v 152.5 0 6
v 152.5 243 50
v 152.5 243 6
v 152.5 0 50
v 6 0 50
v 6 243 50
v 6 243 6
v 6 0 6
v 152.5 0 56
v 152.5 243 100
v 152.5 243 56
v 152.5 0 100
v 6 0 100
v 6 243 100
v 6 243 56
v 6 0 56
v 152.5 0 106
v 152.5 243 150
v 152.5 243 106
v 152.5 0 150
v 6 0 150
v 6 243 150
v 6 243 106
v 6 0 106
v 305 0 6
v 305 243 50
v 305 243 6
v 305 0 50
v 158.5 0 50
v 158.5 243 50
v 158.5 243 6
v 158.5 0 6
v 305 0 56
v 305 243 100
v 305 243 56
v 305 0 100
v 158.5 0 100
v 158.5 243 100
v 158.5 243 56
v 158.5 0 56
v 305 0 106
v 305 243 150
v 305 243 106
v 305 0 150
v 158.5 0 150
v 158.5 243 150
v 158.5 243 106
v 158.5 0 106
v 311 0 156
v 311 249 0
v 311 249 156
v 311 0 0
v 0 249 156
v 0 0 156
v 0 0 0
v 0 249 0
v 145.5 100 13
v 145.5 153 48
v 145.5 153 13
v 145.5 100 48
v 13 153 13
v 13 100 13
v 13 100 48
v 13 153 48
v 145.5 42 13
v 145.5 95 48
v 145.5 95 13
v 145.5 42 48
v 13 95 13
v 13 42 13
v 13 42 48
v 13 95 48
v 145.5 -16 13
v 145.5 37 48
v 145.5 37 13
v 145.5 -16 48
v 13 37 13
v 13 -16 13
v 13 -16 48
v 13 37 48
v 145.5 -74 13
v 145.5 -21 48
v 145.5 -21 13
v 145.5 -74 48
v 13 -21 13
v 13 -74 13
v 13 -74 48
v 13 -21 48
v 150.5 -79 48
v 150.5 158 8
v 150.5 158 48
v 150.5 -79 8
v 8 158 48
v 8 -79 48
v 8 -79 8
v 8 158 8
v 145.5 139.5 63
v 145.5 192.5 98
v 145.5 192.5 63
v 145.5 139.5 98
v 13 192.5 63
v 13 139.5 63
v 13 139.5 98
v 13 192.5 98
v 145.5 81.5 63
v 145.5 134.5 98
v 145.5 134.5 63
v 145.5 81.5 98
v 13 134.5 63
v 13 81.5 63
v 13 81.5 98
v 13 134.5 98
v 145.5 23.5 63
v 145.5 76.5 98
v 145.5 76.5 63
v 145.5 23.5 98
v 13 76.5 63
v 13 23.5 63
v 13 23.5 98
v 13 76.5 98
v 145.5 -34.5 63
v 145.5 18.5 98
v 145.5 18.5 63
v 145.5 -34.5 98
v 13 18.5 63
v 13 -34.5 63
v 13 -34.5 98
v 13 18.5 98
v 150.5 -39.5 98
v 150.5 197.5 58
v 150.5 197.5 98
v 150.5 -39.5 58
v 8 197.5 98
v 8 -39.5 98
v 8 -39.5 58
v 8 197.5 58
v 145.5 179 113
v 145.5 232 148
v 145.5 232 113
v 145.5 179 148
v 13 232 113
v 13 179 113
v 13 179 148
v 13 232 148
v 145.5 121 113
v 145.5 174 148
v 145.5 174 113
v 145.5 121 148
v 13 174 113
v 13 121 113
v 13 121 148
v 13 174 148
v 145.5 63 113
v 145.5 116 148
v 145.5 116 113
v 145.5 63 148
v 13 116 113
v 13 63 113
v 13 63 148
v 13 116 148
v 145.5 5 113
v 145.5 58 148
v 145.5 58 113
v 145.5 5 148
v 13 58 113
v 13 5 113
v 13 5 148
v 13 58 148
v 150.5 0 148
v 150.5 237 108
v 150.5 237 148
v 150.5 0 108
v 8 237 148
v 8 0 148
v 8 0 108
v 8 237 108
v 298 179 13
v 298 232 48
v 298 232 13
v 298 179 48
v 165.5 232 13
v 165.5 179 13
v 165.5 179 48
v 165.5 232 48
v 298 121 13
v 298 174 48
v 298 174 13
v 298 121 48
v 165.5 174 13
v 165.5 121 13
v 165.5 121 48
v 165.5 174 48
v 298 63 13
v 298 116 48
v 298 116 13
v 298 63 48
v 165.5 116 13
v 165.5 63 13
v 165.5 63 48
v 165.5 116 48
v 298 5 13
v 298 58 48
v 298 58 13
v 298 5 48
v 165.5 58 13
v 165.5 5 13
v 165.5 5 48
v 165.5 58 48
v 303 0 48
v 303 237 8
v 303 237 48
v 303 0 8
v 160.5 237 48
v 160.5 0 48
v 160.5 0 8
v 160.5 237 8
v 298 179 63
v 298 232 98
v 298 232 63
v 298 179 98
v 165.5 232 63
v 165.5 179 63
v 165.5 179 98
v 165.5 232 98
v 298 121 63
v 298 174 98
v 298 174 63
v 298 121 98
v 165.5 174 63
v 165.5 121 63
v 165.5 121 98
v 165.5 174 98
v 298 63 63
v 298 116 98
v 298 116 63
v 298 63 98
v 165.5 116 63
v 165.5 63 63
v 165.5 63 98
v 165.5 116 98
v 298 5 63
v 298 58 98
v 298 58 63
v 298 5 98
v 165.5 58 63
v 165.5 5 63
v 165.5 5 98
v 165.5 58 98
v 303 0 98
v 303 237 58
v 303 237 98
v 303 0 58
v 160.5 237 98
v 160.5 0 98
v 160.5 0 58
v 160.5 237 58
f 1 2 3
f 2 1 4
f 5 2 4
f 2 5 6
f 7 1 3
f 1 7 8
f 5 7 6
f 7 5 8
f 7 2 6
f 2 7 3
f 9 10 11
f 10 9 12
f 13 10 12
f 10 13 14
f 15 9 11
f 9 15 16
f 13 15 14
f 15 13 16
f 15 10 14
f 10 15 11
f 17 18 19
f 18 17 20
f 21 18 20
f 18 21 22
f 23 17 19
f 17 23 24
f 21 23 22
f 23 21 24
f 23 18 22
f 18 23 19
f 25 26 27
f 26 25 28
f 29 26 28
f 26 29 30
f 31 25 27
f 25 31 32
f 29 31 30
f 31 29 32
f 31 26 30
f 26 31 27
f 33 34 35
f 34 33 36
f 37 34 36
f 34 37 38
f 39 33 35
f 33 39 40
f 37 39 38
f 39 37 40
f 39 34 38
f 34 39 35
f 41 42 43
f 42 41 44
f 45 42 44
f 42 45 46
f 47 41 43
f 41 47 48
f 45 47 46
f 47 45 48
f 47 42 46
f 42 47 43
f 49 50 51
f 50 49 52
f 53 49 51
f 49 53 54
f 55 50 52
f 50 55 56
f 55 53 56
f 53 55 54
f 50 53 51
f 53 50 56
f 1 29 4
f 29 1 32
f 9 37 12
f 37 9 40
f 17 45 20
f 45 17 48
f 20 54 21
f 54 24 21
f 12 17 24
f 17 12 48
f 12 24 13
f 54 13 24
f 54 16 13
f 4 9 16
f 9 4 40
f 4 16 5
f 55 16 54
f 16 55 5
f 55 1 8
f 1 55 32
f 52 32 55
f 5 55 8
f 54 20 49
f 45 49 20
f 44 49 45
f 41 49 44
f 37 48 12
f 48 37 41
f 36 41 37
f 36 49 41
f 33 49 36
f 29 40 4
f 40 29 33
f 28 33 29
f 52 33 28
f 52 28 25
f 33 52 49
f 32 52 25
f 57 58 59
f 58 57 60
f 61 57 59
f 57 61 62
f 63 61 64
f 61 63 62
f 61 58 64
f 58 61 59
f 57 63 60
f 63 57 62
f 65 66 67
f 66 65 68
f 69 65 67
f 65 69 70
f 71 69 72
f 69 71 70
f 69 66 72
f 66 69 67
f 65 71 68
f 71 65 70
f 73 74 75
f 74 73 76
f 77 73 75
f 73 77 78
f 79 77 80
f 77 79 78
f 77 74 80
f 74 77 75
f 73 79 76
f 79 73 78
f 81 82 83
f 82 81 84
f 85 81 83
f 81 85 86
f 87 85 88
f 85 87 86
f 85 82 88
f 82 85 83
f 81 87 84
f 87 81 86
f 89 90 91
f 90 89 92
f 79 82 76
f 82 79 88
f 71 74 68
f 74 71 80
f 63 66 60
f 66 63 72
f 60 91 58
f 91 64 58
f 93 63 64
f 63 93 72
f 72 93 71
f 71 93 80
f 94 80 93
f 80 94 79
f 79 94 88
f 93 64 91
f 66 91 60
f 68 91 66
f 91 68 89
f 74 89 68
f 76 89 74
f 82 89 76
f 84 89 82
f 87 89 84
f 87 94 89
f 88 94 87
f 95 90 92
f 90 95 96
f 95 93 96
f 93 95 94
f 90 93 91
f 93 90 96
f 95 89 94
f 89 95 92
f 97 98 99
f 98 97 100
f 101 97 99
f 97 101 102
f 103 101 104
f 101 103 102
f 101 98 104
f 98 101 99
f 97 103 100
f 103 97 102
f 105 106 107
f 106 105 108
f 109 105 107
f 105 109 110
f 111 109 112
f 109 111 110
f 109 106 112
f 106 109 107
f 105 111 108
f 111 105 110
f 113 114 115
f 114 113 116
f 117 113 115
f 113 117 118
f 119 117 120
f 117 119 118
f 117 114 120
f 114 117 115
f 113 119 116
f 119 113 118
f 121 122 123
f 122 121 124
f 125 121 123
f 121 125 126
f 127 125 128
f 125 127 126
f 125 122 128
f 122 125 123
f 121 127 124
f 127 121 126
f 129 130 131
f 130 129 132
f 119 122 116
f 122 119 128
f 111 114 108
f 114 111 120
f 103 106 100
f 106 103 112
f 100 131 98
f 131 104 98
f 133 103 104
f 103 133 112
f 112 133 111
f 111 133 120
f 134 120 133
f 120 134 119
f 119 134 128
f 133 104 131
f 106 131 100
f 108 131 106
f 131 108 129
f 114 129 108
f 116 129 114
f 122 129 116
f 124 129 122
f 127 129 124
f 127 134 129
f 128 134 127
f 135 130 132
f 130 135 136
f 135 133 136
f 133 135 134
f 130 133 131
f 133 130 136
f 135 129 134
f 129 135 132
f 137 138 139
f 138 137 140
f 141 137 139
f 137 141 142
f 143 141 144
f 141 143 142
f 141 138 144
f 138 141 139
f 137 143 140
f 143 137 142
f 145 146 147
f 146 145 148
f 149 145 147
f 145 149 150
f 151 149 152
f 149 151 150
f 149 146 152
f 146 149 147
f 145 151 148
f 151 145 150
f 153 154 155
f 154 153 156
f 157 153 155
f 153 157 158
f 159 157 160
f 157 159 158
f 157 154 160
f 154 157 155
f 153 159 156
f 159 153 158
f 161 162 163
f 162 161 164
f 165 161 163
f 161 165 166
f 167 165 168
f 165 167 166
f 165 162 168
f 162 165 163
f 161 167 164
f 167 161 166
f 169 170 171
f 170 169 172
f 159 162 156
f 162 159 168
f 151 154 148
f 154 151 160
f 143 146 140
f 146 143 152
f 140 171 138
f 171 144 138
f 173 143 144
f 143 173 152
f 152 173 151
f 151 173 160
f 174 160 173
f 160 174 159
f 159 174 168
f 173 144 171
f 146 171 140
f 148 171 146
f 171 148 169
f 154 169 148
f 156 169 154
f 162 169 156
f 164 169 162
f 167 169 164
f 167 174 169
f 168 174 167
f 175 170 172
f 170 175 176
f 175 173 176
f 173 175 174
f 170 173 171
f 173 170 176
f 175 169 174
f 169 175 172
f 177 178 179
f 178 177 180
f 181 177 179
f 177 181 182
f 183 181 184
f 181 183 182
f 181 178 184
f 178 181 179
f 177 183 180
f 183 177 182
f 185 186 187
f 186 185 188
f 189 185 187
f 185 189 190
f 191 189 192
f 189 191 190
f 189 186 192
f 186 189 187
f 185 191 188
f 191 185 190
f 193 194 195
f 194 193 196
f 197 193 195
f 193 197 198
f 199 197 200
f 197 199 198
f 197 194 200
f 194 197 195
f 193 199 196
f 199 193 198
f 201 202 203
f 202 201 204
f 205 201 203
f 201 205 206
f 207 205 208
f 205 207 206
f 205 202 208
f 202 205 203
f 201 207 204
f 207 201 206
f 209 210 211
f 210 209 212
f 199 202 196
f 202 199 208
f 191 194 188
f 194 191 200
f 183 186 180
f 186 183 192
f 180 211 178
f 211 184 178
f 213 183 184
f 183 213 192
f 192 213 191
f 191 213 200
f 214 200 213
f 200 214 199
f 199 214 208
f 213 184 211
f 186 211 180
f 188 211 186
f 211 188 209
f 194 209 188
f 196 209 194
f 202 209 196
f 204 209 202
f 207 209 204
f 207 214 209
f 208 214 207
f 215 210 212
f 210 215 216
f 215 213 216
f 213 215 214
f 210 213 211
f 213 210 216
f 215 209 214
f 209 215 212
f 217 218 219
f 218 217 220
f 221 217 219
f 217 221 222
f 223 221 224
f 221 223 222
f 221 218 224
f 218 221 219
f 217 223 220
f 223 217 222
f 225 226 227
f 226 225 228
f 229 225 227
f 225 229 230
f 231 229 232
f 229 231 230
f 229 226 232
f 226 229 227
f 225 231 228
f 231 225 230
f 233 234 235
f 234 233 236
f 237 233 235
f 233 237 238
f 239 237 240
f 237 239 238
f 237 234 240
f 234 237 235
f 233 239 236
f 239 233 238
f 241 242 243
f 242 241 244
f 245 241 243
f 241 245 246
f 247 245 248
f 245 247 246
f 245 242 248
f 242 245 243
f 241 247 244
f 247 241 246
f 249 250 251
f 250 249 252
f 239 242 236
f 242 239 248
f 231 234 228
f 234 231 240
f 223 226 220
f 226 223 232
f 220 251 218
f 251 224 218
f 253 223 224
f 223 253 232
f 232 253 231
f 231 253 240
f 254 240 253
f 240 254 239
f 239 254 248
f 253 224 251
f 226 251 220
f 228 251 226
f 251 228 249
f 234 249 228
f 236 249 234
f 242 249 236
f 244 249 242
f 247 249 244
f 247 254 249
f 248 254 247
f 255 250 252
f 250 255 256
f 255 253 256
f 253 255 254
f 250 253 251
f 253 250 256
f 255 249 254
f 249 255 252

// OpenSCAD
// tiroir.scad
// mer. 20 avril 2022 16:27:03 CEST
// caractéritique de la boite englobante
/////////////////////////////////////////
NbCol = 2; // NbCol tiroirs accolés = c'est le nb de colonne de tiroirs
NbLin = 3; // NbLin tiroirs superposés = c'est le nb de ligne de tiroirs
NbCaz = 4; // Nbcaz nombre de cases dans le tiroir 
// Lx= 290;   // Longeur hors tout (de face)
Lx= 311;   // Longeur hors tout (de face)
Ly= 249;   // Profondeur hors tout (largeur vue de dessus) 
Hz= 156;   // Hauteur du bloc hors tout 
Ep=   6;   // épaisseur des cloisons du bloc
j =   2;   // jeu autour de chaque face du tiroir (2 pour tissus, sinon 1.5)  
Tp=   5;   // épaisseur des cloisons de tiroirs

// ne pas toucher
delta= 1;  // dépassement pour les différences


// Affichage des caractéristiques
/////////////////////////////////
echo("Hors Tout Externes");
echo(Lx=Lx, Ly=Ly, Hz=Hz);

// Calcul de chaque case pour tiroir 
////////////////////////////////////
Lxi= (Lx - (NbCol+1)*Ep)/NbCol;
Hzi= (Hz - (NbLin+1)*Ep)/NbLin;
echo("Cotes Interieures");
echo(Lxi=Lxi, NbCol=NbCol);
echo(Hzi=Hzi, NbLin=NbLin);

// Calcul de chaque tiroir 
//////////////////////////
Tx= Lxi-2*j;
Ty= Ly-Ep-3*j;
Tz= Hzi -2*j;
echo("Cotes 'Tiroir' Extérieures");
echo(Tx=Tx, Ty=Ty, Tz=Tz);
Txi= Tx-2*Tp;
Tyi= Ty-2*Tp;
Tzi= Tz-Tp;
echo("Cotes 'Tiroir' Intérieures");
echo(Txi=Txi, Tyi=Tyi, Tzi=Tzi);
Tycase= (Tyi -(NbCaz-1)*Tp)/NbCaz;
echo(Tycase=Tycase);

bexterne();
tiroirs(); 

// module tiroirs
/////////////////
module tiroirs(){
  for(i=[1:NbCol]){
    for(k=[1:NbLin]){
      if((k!=NbLin)||(i!=NbCol)){      
         translate([Ep+j+(i-1)*(Ep+Tx+2*j),
                   -(NbCol-i)*(NbLin-k)*Ty/(NbCol*NbLin),
                   Ep+j+(k-1)*(Ep+Tz+2*j)])
         tiroir();
      }
    }
  }
}

// module tiroir
////////////////
module tiroir(){
  difference(){
    cube([Tx,Ty,Tz]);
	for(i=[1:NbCaz]){
	  // translate([Tp,Tp,Tp]) cube([Txi,Tyi,Tzi+delta]);
	  translate([Tp,Tp+(NbCaz-i)*(Tp+Tycase),Tp]) cube([Txi,Tycase,Tzi+delta]);
	  }
  }
}

// module boite externe
///////////////////////
module bexterne(){
  difference(){
    cube([Lx,Ly,Hz]);
    for(i=[1:NbCol]){
      for(k=[1:NbLin]){
        translate([Ep+(i-1)*(Ep+Lxi),-delta,Ep+(k-1)*(Ep+Hzi)])
        cube([Lxi,Ly-Ep+delta,Hzi]);
      }
    }
  } 
}
